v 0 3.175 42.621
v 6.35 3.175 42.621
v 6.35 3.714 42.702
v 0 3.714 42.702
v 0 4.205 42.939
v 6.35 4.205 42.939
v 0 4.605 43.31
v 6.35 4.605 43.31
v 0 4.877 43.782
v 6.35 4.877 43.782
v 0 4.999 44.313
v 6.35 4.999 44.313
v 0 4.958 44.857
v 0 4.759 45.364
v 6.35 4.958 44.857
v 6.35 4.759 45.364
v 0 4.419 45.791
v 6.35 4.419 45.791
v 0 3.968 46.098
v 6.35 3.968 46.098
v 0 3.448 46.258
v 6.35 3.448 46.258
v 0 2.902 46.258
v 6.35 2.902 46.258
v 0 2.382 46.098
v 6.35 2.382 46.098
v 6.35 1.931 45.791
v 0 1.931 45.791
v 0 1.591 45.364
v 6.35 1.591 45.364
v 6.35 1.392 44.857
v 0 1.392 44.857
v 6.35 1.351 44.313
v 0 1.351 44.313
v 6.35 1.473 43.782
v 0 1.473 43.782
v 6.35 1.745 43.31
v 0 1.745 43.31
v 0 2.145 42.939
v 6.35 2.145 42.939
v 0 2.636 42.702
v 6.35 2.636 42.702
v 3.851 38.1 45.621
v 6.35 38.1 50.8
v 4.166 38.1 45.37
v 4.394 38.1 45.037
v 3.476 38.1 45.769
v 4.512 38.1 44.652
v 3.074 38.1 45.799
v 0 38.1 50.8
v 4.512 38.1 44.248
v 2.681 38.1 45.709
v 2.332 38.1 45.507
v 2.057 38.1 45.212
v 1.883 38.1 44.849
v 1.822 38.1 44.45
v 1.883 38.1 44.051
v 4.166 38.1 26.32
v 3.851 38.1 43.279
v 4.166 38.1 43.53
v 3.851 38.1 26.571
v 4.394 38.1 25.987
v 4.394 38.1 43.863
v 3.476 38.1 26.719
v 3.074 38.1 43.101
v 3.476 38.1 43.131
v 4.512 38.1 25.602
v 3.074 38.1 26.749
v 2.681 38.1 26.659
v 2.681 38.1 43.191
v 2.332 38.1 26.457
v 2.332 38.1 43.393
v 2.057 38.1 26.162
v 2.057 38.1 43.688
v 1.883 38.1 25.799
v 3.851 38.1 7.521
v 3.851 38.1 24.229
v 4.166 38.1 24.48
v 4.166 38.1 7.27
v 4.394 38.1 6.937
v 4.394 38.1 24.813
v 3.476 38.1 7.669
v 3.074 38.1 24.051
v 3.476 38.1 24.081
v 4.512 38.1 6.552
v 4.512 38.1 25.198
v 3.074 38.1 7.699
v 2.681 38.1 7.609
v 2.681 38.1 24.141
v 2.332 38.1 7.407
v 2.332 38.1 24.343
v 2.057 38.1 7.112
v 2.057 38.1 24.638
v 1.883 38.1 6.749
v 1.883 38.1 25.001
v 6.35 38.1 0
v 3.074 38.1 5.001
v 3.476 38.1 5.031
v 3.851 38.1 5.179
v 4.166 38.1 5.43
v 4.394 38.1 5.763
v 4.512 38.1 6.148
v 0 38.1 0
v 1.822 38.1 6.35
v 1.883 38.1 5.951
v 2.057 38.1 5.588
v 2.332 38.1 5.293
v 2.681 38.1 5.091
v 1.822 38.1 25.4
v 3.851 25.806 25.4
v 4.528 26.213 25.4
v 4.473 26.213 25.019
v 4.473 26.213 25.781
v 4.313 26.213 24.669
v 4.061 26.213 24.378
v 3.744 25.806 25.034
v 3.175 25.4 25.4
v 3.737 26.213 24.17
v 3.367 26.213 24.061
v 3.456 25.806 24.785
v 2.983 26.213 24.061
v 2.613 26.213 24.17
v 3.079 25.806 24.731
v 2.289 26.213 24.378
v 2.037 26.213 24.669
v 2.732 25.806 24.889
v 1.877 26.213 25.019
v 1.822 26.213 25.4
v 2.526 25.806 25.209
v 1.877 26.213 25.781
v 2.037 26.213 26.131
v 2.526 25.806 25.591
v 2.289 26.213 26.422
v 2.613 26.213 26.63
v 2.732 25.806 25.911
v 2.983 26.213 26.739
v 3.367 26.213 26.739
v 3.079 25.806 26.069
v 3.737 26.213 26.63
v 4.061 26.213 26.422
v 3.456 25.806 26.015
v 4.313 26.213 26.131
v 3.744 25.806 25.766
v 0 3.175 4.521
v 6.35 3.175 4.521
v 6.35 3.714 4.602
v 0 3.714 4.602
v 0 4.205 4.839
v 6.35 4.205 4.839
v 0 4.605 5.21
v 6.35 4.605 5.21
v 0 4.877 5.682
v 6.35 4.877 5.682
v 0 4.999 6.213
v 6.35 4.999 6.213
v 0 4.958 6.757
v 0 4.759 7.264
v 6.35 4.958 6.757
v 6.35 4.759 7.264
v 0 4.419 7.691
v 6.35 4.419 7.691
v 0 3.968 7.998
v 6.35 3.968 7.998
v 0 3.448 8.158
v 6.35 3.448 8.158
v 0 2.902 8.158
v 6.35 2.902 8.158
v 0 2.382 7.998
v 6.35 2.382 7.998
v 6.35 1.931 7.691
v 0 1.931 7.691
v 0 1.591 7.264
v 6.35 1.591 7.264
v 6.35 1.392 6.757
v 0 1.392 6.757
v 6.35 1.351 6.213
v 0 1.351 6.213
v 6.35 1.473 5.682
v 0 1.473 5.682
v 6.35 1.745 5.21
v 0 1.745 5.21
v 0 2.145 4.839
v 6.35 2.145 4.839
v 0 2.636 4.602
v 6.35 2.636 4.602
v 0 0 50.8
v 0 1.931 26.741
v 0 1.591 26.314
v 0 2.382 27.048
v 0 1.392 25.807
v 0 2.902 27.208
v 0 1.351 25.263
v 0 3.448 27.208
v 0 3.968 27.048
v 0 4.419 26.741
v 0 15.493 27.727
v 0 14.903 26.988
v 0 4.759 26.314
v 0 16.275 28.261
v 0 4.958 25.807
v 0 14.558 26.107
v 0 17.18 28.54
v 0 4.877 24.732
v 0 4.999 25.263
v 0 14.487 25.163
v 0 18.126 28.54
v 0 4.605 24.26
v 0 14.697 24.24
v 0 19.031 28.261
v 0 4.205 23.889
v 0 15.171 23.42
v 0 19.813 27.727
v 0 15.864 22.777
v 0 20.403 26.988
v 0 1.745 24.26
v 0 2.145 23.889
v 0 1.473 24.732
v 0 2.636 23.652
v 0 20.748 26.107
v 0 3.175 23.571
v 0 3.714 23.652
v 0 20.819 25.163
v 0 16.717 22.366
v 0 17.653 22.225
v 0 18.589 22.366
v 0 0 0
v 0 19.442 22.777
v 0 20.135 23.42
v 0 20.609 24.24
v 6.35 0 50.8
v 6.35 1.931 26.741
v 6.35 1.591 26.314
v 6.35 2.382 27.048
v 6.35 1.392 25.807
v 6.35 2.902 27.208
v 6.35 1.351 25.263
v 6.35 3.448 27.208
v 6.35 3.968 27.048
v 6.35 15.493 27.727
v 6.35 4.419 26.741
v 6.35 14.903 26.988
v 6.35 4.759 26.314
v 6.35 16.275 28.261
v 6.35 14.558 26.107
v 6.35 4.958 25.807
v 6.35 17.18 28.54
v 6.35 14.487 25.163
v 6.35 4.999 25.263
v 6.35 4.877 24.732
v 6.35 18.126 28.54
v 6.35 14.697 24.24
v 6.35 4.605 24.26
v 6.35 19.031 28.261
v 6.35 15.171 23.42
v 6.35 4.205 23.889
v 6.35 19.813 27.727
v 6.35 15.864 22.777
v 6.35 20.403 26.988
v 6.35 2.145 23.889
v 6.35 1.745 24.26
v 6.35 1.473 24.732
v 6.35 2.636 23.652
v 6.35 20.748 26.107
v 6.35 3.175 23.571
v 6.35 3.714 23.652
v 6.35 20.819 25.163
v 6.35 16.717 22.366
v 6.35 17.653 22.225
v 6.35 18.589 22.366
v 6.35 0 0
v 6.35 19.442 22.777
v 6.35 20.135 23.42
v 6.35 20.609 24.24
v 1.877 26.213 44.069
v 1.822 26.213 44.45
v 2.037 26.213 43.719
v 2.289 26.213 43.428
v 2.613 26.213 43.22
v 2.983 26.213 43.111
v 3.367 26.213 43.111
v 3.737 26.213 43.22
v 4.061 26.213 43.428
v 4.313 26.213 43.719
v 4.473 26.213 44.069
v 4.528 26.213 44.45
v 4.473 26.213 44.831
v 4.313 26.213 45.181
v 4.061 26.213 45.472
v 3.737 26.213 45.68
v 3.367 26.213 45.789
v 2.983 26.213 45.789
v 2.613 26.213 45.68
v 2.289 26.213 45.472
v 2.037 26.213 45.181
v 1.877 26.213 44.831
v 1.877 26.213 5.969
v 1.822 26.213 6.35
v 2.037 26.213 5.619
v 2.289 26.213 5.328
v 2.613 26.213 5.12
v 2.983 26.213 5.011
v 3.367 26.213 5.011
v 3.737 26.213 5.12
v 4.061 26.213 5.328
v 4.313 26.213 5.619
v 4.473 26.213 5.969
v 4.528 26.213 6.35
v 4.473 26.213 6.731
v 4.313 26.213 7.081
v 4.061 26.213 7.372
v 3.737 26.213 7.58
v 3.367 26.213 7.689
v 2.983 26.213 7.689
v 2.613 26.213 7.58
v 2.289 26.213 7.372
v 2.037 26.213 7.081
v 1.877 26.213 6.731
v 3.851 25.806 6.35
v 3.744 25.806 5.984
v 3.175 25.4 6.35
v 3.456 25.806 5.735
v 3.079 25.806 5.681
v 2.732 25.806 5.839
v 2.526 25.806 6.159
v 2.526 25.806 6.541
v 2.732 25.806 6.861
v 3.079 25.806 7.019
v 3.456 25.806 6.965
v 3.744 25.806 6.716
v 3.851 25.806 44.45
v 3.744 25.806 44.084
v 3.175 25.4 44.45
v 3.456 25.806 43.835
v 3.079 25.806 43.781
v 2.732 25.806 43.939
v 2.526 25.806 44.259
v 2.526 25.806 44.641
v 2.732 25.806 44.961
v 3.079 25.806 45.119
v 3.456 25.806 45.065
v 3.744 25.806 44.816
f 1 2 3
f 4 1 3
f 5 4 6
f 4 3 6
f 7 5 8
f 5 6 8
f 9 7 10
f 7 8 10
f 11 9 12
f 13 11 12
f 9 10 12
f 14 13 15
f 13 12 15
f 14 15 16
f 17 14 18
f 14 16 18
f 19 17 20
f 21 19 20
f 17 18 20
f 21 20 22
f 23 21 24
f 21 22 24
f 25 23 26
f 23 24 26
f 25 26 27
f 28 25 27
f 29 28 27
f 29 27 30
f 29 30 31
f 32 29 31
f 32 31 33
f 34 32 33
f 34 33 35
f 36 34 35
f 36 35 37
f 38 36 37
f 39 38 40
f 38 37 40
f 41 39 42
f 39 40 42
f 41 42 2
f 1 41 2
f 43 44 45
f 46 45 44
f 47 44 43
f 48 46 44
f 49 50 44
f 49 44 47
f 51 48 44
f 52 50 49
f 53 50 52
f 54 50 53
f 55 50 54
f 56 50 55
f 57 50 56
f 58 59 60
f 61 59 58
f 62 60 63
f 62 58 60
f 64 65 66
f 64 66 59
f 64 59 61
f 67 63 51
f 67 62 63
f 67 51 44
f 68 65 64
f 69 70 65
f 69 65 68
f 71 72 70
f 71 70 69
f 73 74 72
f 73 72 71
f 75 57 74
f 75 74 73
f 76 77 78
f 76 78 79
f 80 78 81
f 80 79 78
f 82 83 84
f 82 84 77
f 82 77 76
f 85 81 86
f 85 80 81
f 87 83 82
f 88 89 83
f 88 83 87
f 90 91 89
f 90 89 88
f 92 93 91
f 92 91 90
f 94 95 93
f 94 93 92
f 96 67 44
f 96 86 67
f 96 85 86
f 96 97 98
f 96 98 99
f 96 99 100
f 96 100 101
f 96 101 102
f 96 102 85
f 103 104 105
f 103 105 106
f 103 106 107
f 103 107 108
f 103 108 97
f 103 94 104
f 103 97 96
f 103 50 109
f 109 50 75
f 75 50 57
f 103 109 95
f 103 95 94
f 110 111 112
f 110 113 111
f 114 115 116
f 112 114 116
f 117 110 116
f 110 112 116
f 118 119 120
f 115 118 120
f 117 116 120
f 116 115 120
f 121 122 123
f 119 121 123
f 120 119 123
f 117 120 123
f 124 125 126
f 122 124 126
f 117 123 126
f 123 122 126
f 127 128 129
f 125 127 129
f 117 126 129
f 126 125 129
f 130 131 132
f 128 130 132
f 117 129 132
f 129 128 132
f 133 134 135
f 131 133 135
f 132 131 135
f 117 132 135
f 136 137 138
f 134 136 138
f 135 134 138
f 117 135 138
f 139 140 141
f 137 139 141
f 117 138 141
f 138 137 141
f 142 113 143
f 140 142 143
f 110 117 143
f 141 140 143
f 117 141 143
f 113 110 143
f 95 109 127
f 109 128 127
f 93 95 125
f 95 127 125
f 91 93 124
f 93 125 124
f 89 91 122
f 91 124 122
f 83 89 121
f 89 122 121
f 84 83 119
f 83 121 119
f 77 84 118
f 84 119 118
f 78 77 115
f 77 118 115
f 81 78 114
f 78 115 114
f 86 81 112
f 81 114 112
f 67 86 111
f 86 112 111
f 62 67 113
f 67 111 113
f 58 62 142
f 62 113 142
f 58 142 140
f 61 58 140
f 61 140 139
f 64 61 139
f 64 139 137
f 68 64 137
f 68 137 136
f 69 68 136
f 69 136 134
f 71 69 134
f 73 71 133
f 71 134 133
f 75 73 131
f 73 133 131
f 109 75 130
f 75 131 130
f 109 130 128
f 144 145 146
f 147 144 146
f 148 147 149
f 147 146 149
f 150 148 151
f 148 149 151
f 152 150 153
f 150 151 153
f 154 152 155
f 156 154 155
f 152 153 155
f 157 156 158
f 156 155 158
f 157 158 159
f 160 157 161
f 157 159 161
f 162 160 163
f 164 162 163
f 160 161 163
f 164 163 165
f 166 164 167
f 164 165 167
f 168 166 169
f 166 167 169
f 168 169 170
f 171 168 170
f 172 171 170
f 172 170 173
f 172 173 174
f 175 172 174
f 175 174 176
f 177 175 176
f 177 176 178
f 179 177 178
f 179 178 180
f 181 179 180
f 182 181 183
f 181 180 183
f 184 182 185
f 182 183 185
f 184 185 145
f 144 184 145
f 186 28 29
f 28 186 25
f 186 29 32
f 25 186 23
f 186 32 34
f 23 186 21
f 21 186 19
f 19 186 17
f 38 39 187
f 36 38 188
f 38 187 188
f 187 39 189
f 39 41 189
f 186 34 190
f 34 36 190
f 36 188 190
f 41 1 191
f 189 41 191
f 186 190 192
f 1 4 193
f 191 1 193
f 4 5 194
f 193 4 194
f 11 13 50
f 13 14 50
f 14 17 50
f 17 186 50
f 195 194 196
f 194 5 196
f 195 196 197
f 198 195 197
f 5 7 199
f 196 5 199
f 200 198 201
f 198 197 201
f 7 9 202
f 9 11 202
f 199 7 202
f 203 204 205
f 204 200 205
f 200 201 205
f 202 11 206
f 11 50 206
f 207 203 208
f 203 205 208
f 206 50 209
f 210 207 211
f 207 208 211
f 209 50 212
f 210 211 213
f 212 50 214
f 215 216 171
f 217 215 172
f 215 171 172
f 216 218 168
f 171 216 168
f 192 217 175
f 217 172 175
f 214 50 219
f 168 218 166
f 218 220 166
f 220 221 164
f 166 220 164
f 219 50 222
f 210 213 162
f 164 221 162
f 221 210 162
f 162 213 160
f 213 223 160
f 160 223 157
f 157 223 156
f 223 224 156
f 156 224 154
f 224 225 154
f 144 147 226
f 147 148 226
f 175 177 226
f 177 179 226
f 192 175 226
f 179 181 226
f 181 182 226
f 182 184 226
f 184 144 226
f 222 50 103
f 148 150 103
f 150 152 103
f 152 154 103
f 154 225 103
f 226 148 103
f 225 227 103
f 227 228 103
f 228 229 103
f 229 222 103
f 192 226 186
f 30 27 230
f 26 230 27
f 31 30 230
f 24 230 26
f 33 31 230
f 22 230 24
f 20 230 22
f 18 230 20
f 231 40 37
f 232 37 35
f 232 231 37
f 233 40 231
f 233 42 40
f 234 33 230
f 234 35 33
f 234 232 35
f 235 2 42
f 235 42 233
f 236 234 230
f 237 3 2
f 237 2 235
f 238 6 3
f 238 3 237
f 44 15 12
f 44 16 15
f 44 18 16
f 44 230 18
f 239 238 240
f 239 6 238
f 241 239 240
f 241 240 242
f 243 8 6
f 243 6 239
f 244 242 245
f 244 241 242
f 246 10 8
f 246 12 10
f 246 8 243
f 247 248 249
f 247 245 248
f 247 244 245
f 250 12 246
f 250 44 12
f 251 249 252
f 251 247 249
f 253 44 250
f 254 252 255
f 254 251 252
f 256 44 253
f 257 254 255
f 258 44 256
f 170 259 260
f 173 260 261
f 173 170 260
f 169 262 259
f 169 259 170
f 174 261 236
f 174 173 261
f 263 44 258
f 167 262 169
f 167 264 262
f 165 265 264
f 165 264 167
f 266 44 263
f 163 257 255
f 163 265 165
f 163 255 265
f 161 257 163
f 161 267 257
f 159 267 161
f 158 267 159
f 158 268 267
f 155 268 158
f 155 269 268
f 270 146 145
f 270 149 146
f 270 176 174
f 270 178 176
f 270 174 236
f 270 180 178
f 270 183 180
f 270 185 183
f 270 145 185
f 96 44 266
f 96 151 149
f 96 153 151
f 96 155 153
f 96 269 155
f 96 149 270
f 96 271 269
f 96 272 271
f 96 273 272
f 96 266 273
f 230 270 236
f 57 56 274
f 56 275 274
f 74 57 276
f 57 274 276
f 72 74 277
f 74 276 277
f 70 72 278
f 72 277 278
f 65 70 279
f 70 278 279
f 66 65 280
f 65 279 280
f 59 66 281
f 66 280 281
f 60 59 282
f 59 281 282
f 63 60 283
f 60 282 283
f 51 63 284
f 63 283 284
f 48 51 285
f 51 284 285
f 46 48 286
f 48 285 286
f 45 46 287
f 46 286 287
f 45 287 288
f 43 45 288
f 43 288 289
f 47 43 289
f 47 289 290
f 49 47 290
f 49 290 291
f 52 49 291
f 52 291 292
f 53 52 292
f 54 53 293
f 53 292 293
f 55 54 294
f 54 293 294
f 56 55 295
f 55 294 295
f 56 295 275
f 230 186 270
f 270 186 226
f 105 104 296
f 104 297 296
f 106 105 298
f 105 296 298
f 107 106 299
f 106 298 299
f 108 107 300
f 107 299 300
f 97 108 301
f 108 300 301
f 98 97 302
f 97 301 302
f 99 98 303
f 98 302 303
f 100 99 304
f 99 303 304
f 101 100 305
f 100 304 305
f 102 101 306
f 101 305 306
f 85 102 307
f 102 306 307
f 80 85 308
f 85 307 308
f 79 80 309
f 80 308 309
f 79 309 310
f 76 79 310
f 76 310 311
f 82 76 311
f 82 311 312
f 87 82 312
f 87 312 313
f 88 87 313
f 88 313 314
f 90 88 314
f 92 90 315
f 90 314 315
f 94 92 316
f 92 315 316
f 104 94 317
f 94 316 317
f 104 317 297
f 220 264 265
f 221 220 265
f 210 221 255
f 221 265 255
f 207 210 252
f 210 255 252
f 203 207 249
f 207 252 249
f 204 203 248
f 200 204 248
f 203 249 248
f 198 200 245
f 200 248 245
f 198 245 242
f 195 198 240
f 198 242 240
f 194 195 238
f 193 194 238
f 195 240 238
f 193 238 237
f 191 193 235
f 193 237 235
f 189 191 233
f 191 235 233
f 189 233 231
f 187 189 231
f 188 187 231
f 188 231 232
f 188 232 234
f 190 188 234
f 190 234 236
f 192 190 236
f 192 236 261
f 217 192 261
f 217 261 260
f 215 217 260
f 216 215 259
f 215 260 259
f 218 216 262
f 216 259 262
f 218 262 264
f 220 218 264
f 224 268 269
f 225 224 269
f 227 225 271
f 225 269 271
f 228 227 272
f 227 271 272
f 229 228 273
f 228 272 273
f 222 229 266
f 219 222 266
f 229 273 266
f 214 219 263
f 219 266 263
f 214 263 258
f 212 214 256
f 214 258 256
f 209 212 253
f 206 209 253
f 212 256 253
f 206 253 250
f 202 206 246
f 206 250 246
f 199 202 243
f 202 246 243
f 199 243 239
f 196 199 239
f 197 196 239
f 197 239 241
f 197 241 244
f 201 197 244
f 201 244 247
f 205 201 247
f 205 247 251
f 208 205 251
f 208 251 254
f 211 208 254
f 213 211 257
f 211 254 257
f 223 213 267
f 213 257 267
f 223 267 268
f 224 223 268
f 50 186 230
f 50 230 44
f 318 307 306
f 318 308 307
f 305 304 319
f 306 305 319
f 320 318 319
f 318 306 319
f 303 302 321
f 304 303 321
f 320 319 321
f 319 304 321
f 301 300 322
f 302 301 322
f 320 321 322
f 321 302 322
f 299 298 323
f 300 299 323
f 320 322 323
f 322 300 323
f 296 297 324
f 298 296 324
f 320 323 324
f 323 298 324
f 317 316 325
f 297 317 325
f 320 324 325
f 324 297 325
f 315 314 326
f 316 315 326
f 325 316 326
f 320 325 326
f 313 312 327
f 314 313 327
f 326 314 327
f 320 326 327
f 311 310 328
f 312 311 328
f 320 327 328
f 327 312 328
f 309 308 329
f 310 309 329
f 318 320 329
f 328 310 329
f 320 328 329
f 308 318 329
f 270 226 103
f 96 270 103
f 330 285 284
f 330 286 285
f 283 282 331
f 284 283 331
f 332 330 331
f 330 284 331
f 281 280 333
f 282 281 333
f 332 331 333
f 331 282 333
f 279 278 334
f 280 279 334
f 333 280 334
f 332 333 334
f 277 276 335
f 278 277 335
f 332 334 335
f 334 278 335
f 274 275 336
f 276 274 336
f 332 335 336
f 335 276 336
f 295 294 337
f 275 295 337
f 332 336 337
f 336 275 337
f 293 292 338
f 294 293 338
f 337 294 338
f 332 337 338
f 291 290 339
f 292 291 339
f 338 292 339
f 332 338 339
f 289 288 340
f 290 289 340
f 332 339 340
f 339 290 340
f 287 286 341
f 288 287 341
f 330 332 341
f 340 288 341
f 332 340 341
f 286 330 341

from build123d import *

# Parameters (mm, degrees)
SKETCH1_W                 = 50.8
SKETCH1_H                 = 38.1
BOSS_EXTRUDE1_DEPTH       = 6.35
SKETCH3_R                 = 1.8288
CUT_EXTRUDE1_DEPTH        = 6.35
F_6_32_TAPPED_HOLE1_D     = 2.7051
F_6_32_TAPPED_HOLE1_DEPTH = 11.88730597
F_6_32_TAPPED_HOLE1_TIP   = 0.81269403
SKETCH12_R                = 3.175
CUT_EXTRUDE3_DEPTH        = 6.35


with BuildPart() as part:
    # Sketch1 → Boss-Extrude1 (new body)
    with BuildSketch(Plane(origin=(0, 0, 0), x_dir=(0, 0, -1), z_dir=(1, 0, 0))):
        with Locations((-25.4, 19.05)):
            Rectangle(SKETCH1_W, SKETCH1_H)
    extrude(amount=BOSS_EXTRUDE1_DEPTH)

    # Sketch3 → Cut-Extrude1 (cut)
    with BuildSketch(Plane(origin=(6.35, 0, 0), x_dir=(0, 0, -1), z_dir=(1, 0, 0))):
        with Locations((-44.45, 3.175)):
            Circle(SKETCH3_R)
        with Locations((-25.4, 3.175)):
            Circle(SKETCH3_R)
        with Locations((-6.35, 3.175)):
            Circle(SKETCH3_R)
    extrude(amount=-CUT_EXTRUDE1_DEPTH, mode=Mode.SUBTRACT)

    # #6-32 Tapped Hole1
    with Locations(Plane(origin=(0, 38.1, 0), x_dir=(1, 0, 0), z_dir=(0, 1, 0))):
        with Locations((3.175, -6.35), (3.175, -25.4), (3.175, -44.45)):
            Hole(F_6_32_TAPPED_HOLE1_D / 2, depth=F_6_32_TAPPED_HOLE1_DEPTH)
            with Locations((0, 0, -(F_6_32_TAPPED_HOLE1_DEPTH + F_6_32_TAPPED_HOLE1_TIP / 2))):  # 118° drill point
                Cone(0, F_6_32_TAPPED_HOLE1_D / 2, F_6_32_TAPPED_HOLE1_TIP, mode=Mode.SUBTRACT)

    # Sketch12 → Cut-Extrude3 (cut)
    with BuildSketch(Plane(origin=(6.35, 0, 0), x_dir=(0, 0, -1), z_dir=(1, 0, 0))):
        with Locations((-25.4, 17.653)):
            Circle(SKETCH12_R)
    extrude(amount=-CUT_EXTRUDE3_DEPTH, mode=Mode.SUBTRACT)


solid = part.part
